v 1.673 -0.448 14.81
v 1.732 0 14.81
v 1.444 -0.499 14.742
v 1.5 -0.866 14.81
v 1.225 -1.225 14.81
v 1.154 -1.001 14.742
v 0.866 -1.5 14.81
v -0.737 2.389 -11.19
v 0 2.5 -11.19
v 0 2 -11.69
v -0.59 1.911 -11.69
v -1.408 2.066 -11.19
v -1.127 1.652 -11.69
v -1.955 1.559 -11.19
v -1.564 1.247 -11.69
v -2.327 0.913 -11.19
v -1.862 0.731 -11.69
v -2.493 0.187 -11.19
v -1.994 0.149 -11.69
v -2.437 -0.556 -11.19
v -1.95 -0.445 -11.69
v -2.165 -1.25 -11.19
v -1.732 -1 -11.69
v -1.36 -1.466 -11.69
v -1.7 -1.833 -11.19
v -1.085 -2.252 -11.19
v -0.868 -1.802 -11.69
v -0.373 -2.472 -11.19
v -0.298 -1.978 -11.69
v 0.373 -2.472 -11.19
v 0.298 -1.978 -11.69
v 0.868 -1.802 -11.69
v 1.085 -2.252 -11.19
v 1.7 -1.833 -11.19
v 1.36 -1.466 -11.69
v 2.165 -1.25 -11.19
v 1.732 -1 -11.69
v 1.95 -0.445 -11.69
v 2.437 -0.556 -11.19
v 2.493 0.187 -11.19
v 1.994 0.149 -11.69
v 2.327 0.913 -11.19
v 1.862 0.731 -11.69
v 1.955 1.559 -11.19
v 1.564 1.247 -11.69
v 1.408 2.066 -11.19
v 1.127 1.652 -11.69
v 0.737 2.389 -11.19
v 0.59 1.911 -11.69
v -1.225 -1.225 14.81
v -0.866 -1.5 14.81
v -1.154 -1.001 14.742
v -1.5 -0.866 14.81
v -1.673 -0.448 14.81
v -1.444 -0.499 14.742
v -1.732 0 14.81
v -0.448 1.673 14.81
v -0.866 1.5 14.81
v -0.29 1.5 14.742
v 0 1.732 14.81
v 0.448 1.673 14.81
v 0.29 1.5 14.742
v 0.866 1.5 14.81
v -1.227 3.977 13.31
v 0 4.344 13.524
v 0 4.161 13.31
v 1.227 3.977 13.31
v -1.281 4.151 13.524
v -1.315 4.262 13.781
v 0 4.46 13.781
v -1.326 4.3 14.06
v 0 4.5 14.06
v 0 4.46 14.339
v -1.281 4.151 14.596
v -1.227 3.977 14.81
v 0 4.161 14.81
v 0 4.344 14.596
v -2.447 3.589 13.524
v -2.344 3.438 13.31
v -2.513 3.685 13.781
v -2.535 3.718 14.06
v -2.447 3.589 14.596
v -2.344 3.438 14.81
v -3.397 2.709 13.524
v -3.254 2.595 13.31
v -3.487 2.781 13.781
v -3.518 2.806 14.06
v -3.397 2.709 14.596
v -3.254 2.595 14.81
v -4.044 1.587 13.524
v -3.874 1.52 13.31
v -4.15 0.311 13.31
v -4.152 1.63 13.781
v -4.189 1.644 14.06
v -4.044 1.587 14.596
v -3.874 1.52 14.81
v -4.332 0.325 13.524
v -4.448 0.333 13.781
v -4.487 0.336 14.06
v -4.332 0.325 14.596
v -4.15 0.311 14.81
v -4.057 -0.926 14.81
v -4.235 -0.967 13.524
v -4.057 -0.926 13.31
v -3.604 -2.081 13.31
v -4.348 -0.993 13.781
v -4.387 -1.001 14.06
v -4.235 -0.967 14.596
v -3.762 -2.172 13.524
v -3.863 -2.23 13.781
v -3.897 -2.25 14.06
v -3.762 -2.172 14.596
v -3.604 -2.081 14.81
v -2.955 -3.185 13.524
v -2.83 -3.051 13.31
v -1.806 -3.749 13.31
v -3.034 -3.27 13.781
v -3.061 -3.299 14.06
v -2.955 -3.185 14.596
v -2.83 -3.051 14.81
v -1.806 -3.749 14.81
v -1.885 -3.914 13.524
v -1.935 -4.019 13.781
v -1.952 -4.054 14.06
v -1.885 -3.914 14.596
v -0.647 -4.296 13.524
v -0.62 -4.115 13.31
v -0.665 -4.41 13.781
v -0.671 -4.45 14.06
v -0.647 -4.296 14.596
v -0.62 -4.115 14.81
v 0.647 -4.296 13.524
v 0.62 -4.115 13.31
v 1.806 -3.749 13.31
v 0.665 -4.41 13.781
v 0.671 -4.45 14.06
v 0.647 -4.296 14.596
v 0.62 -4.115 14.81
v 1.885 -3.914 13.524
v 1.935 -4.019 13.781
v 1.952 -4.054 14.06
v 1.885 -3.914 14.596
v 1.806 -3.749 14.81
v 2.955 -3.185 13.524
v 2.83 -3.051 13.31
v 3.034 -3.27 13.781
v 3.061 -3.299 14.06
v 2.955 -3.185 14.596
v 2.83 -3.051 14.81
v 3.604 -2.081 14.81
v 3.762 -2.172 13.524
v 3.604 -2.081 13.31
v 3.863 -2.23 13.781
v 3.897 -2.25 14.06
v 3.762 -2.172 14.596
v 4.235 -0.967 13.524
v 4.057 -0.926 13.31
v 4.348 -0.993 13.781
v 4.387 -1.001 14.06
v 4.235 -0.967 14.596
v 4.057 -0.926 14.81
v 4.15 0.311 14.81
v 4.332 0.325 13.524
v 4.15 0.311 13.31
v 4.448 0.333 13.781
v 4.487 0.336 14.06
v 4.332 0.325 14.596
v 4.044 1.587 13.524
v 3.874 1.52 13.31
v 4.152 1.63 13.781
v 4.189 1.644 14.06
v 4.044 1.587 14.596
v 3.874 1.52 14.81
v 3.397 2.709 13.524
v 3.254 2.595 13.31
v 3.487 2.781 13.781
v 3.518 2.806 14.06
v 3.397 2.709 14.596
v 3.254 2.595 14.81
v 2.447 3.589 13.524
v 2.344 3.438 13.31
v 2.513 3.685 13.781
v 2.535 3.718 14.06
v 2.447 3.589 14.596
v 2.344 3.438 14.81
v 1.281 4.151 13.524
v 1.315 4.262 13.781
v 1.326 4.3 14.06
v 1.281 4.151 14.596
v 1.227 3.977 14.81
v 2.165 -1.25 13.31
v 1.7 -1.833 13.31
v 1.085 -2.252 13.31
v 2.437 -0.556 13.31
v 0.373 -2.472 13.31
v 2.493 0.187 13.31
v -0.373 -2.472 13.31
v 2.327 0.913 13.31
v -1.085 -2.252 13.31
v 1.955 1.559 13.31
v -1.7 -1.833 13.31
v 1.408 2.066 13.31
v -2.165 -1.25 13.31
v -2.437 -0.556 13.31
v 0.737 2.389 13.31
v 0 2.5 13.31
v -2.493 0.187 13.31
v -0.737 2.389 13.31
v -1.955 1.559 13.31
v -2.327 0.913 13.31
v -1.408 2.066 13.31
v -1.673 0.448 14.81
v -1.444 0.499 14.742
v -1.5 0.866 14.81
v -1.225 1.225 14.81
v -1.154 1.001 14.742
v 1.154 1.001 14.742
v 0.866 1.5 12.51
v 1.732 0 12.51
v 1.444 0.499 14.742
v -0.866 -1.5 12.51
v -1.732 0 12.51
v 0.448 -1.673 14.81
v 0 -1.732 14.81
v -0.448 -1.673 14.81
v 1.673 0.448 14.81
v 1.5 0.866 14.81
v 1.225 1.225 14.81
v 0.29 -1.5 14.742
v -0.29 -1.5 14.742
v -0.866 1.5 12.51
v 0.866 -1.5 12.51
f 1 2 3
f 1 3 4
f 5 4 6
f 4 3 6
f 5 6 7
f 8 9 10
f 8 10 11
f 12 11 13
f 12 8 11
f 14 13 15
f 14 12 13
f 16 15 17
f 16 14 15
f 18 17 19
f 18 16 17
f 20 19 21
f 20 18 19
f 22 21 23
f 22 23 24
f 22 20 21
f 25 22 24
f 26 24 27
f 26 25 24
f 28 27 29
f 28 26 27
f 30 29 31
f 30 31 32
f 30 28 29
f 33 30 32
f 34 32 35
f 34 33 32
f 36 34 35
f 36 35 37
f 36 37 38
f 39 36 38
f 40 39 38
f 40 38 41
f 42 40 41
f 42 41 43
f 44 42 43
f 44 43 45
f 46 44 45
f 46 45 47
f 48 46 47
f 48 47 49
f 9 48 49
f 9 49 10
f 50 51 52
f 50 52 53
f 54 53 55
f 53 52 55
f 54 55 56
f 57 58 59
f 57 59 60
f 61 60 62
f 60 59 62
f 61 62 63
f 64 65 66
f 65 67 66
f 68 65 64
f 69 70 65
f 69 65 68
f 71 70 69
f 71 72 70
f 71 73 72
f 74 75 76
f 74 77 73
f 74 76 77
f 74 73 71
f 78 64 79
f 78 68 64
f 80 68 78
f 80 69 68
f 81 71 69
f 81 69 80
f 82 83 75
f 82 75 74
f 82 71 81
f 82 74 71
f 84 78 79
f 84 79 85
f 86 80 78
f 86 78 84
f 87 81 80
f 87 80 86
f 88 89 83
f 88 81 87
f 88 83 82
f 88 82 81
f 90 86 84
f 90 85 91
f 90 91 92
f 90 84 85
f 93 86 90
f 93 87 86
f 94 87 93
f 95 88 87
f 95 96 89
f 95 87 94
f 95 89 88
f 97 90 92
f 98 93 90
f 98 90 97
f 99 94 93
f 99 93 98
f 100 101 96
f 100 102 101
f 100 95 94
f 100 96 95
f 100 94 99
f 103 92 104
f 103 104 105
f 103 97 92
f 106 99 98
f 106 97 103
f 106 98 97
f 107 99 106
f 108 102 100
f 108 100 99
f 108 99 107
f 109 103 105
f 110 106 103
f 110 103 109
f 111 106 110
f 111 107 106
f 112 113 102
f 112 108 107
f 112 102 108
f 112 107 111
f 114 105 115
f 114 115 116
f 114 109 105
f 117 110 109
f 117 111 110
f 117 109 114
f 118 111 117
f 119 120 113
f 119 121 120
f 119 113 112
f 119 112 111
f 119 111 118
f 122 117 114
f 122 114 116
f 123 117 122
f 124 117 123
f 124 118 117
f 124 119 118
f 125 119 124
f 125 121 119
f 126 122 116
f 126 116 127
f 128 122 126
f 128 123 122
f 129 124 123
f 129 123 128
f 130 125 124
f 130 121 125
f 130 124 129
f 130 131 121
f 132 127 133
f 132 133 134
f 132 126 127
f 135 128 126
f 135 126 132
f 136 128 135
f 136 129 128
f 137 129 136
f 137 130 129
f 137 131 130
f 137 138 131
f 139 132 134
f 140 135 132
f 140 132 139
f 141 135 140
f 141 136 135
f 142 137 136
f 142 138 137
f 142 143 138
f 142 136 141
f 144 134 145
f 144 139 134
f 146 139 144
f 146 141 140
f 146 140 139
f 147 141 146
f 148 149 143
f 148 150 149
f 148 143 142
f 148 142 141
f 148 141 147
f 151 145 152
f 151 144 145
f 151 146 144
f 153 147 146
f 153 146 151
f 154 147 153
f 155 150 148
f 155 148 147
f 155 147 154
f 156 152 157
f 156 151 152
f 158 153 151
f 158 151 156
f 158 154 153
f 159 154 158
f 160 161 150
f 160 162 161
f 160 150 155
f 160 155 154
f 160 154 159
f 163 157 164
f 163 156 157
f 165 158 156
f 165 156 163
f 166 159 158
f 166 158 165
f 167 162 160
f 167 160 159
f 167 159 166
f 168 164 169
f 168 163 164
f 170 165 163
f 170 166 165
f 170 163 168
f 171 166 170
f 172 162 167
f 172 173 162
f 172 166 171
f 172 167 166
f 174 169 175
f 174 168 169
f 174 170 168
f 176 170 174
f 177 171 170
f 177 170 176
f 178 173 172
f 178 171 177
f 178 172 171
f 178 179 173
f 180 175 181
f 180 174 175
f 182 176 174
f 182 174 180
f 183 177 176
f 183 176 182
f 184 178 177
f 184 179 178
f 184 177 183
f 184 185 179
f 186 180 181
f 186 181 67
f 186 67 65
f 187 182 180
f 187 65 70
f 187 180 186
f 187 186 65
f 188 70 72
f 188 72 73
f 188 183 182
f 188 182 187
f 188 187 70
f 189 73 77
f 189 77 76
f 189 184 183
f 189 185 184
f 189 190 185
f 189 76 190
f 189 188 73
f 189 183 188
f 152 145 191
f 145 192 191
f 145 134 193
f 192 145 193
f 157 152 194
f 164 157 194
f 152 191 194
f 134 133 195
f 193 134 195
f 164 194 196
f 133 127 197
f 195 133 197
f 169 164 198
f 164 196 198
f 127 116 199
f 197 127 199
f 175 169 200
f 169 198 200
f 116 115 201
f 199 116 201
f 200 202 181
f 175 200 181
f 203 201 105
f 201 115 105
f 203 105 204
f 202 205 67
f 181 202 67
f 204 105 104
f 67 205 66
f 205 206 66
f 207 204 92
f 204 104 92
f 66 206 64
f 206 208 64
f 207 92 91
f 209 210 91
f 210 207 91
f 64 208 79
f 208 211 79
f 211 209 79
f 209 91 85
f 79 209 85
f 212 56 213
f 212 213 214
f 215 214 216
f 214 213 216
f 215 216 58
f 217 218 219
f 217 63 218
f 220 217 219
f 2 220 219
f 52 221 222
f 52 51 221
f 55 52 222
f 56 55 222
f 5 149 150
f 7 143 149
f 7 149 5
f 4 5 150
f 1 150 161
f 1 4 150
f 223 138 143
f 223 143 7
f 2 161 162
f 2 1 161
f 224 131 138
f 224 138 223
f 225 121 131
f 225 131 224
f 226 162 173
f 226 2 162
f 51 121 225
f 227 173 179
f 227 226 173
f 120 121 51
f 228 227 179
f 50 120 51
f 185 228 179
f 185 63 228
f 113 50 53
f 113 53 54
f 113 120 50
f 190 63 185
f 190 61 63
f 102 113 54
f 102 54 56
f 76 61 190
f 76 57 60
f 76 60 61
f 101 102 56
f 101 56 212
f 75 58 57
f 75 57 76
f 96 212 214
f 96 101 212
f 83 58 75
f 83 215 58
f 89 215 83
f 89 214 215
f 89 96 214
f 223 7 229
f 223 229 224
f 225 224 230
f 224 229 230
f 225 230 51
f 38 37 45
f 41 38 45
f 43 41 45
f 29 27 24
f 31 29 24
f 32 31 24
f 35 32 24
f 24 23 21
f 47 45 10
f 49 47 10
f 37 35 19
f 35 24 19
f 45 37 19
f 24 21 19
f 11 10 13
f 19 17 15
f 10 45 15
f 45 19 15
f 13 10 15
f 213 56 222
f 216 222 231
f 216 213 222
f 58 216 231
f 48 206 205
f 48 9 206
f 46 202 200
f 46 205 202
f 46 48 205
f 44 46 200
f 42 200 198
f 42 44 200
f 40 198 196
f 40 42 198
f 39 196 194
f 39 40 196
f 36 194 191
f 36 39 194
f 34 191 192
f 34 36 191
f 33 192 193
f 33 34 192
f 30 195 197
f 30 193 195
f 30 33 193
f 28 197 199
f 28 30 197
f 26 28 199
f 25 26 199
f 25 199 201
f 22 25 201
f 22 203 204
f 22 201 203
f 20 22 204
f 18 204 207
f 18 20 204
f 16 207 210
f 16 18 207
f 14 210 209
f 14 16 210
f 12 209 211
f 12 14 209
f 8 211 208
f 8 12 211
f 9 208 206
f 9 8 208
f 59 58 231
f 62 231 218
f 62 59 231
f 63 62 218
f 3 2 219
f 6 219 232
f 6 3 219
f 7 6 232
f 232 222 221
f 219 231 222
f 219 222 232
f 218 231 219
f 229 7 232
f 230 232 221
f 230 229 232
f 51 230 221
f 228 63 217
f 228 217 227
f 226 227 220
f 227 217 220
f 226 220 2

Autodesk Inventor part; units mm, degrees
ref_plane "YZ Plane" through (0, 0, 0) normal (1, 0, 0) x (0, 1, 0)
ref_plane "XZ Plane" through (0, 0, 0) normal (0, 1, 0) x (-1, 0, 0)
ref_plane "XY Plane" through (0, 0, 0) normal (0, 0, 1) x (1, 0, 0)
sketch "Sketch1" plane through (0, 0, 0) normal (1, 0, 0) x (0, 1, 0)
  line L0 (2.5, 2.81) -> (2.5, 11.31)
  spline S0 degree 2 poles (-3.9658, 2.81) (-4.0258, 2.8689) (-4.0876, 2.9295) knots 0 0 0 0.017848 0.017848 0.017848 weights 1 1.00044 1.00066
  line L1 (-2.5, 11.31) -> (-2.5, 2.81)
  line L2 (1.7321, 14.76) -> (1.7821, 14.81)
  line L3 (-1.7821, 14.81) -> (4.1614, 14.81)
  arc A0 (4.1614, 13.31) -> (4.1614, 14.81) centre (3.5, 14.06) ccw
  line L4 (4.1614, 13.31) -> (2.5, 13.31)
  line L5 (2.5, 13.31) -> (2.5, -11.19)
  line L6 (2.5, -11.19) -> (2, -11.69)
  line L7 (2, -11.69) -> (-2, -11.69)
  line L8 (-2, -11.69) -> (-2.5, -11.19)
  line L9 (-2.5, -11.19) -> (-2.5, 13.31)
  line L10 (-2.5, 13.31) -> (-4.1614, 13.31)
  arc A1 (-4.1614, 14.81) -> (-4.1614, 13.31) centre (-3.5, 14.06) ccw
  line L11 (-4.1614, 14.81) -> (-1.7821, 14.81)
  line L12 (-1.7821, 14.81) -> (-1.7321, 14.76)
  line L13 (-2, -11.69) -> (2, -11.69)
  line L14 (0, -11.69) -> (0, 14.81)
  point P0 (0, 0)
revolve "Revolution1" add sketch "Sketch1" angle 360 about axis through (0, 0, -11.69) along (0, 0, 1) contours L5 L6 L7 L14 L3 A0 L4 L0
sketch "Sketch2" plane through (0, 0, 14.81) normal (0, 0, 1) x (1, 0, 0)
  line L0 (1.732, 0) -> (0.866, -1.5)
  line L1 (0.866, -1.5) -> (-0.866, -1.5)
  line L2 (-0.866, -1.5) -> (-1.732, 0)
  line L3 (-1.732, 0) -> (-0.866, 1.5)
  line L4 (-0.866, 1.5) -> (0.866, 1.5)
  line L5 (0.866, 1.5) -> (1.732, 0)
  point P0 (0, 0)
  point P1 (0, 0)
  dimension "d1" = 3.464
extrude "Extrusion1" cut sketch "Sketch2" against normal blind 2.3
sketch "Sketch3" plane through (0, 0, 0) normal (0, 1, 0) x (-1, 0, 0)
  line L0 (0.866, 14.81) -> (-0.866, 14.81) projected
  line L1 (0.866, 14.81) -> (0.866, 12.51) projected
  line L2 (0.866, 12.51) -> (-0.866, 12.51) projected
  line L3 (-0.866, 14.81) -> (-0.866, 12.51) projected
  line L4 (1.732, 14.81) -> (1.732, 12.51) projected
  circle A0 centre (0, 19.6597) radius 5.1497
  line L5 (0, 14.81) -> (0, 14.51)
  line L6 (0, 14.81) -> (0, 24.8094)
  point P0 (0, 0)
  dimension "d5" = 0.3
revolve "Revolution2" cut sketch "Sketch3" angle 360 about axis through (0, 0, 14.81) along (0, 0, 1) contours L5 A0 L3 L0 | L0 L3 A0 L6
thread "Thread1" size "M5x0.8" class "6g" standard "ANSI Metric M Profile" full length
properties part number "Low Profile Screw M5 [25mm]" material "Steel"
